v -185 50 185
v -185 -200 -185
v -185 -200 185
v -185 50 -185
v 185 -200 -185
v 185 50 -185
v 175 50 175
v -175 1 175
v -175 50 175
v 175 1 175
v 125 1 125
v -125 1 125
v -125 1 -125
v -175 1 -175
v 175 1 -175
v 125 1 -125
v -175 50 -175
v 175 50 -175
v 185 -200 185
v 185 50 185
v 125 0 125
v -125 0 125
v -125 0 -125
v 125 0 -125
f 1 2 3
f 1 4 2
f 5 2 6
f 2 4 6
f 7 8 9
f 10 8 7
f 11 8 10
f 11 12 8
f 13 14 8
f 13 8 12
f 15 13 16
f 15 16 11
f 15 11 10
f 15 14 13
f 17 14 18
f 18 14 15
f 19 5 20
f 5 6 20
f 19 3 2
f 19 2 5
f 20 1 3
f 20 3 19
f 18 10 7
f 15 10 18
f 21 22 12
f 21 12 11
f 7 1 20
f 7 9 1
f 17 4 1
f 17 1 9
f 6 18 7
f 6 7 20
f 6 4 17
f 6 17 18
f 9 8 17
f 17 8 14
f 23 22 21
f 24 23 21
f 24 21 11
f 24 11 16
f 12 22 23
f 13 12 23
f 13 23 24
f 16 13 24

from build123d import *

# Parameters (mm, degrees)
SKETCH_1_W      = 370
SKETCH_1_H      = 370
SKETCH_1_W_2    = 350
SKETCH_1_H_2    = 350
EXTRUDE_1_DEPTH = 50
SKETCH_2_W      = 370
SKETCH_2_H      = 370
EXTRUDE_2_DEPTH = 200
SKETCH_3_W      = 350
SKETCH_3_H      = 350
SKETCH_3_W_2    = 250
SKETCH_3_H_2    = 250
EXTRUDE_3_DEPTH = 1


with BuildPart() as part:
    # 草图1 → 凸台-拉伸1 (new body)
    with BuildSketch(Plane(origin=(0, 0, 0), x_dir=(1, 0, 0), z_dir=(0, 1, 0))):
        Rectangle(SKETCH_1_W, SKETCH_1_H)
        Rectangle(SKETCH_1_W_2, SKETCH_1_H_2, mode=Mode.SUBTRACT)
    extrude(amount=EXTRUDE_1_DEPTH)

    # 草图2 → 凸台-拉伸2 (add)
    with BuildSketch(Plane.XZ):
        Rectangle(SKETCH_2_W, SKETCH_2_H)
    extrude(amount=EXTRUDE_2_DEPTH)

    # 草图3 → 凸台-拉伸3 (add)
    with BuildSketch(Plane(origin=(0, 0, 0), x_dir=(1, 0, 0), z_dir=(0, 1, 0))):
        Rectangle(SKETCH_3_W, SKETCH_3_H)
        Rectangle(SKETCH_3_W_2, SKETCH_3_H_2, mode=Mode.SUBTRACT)
    extrude(amount=EXTRUDE_3_DEPTH)


solid = part.part
